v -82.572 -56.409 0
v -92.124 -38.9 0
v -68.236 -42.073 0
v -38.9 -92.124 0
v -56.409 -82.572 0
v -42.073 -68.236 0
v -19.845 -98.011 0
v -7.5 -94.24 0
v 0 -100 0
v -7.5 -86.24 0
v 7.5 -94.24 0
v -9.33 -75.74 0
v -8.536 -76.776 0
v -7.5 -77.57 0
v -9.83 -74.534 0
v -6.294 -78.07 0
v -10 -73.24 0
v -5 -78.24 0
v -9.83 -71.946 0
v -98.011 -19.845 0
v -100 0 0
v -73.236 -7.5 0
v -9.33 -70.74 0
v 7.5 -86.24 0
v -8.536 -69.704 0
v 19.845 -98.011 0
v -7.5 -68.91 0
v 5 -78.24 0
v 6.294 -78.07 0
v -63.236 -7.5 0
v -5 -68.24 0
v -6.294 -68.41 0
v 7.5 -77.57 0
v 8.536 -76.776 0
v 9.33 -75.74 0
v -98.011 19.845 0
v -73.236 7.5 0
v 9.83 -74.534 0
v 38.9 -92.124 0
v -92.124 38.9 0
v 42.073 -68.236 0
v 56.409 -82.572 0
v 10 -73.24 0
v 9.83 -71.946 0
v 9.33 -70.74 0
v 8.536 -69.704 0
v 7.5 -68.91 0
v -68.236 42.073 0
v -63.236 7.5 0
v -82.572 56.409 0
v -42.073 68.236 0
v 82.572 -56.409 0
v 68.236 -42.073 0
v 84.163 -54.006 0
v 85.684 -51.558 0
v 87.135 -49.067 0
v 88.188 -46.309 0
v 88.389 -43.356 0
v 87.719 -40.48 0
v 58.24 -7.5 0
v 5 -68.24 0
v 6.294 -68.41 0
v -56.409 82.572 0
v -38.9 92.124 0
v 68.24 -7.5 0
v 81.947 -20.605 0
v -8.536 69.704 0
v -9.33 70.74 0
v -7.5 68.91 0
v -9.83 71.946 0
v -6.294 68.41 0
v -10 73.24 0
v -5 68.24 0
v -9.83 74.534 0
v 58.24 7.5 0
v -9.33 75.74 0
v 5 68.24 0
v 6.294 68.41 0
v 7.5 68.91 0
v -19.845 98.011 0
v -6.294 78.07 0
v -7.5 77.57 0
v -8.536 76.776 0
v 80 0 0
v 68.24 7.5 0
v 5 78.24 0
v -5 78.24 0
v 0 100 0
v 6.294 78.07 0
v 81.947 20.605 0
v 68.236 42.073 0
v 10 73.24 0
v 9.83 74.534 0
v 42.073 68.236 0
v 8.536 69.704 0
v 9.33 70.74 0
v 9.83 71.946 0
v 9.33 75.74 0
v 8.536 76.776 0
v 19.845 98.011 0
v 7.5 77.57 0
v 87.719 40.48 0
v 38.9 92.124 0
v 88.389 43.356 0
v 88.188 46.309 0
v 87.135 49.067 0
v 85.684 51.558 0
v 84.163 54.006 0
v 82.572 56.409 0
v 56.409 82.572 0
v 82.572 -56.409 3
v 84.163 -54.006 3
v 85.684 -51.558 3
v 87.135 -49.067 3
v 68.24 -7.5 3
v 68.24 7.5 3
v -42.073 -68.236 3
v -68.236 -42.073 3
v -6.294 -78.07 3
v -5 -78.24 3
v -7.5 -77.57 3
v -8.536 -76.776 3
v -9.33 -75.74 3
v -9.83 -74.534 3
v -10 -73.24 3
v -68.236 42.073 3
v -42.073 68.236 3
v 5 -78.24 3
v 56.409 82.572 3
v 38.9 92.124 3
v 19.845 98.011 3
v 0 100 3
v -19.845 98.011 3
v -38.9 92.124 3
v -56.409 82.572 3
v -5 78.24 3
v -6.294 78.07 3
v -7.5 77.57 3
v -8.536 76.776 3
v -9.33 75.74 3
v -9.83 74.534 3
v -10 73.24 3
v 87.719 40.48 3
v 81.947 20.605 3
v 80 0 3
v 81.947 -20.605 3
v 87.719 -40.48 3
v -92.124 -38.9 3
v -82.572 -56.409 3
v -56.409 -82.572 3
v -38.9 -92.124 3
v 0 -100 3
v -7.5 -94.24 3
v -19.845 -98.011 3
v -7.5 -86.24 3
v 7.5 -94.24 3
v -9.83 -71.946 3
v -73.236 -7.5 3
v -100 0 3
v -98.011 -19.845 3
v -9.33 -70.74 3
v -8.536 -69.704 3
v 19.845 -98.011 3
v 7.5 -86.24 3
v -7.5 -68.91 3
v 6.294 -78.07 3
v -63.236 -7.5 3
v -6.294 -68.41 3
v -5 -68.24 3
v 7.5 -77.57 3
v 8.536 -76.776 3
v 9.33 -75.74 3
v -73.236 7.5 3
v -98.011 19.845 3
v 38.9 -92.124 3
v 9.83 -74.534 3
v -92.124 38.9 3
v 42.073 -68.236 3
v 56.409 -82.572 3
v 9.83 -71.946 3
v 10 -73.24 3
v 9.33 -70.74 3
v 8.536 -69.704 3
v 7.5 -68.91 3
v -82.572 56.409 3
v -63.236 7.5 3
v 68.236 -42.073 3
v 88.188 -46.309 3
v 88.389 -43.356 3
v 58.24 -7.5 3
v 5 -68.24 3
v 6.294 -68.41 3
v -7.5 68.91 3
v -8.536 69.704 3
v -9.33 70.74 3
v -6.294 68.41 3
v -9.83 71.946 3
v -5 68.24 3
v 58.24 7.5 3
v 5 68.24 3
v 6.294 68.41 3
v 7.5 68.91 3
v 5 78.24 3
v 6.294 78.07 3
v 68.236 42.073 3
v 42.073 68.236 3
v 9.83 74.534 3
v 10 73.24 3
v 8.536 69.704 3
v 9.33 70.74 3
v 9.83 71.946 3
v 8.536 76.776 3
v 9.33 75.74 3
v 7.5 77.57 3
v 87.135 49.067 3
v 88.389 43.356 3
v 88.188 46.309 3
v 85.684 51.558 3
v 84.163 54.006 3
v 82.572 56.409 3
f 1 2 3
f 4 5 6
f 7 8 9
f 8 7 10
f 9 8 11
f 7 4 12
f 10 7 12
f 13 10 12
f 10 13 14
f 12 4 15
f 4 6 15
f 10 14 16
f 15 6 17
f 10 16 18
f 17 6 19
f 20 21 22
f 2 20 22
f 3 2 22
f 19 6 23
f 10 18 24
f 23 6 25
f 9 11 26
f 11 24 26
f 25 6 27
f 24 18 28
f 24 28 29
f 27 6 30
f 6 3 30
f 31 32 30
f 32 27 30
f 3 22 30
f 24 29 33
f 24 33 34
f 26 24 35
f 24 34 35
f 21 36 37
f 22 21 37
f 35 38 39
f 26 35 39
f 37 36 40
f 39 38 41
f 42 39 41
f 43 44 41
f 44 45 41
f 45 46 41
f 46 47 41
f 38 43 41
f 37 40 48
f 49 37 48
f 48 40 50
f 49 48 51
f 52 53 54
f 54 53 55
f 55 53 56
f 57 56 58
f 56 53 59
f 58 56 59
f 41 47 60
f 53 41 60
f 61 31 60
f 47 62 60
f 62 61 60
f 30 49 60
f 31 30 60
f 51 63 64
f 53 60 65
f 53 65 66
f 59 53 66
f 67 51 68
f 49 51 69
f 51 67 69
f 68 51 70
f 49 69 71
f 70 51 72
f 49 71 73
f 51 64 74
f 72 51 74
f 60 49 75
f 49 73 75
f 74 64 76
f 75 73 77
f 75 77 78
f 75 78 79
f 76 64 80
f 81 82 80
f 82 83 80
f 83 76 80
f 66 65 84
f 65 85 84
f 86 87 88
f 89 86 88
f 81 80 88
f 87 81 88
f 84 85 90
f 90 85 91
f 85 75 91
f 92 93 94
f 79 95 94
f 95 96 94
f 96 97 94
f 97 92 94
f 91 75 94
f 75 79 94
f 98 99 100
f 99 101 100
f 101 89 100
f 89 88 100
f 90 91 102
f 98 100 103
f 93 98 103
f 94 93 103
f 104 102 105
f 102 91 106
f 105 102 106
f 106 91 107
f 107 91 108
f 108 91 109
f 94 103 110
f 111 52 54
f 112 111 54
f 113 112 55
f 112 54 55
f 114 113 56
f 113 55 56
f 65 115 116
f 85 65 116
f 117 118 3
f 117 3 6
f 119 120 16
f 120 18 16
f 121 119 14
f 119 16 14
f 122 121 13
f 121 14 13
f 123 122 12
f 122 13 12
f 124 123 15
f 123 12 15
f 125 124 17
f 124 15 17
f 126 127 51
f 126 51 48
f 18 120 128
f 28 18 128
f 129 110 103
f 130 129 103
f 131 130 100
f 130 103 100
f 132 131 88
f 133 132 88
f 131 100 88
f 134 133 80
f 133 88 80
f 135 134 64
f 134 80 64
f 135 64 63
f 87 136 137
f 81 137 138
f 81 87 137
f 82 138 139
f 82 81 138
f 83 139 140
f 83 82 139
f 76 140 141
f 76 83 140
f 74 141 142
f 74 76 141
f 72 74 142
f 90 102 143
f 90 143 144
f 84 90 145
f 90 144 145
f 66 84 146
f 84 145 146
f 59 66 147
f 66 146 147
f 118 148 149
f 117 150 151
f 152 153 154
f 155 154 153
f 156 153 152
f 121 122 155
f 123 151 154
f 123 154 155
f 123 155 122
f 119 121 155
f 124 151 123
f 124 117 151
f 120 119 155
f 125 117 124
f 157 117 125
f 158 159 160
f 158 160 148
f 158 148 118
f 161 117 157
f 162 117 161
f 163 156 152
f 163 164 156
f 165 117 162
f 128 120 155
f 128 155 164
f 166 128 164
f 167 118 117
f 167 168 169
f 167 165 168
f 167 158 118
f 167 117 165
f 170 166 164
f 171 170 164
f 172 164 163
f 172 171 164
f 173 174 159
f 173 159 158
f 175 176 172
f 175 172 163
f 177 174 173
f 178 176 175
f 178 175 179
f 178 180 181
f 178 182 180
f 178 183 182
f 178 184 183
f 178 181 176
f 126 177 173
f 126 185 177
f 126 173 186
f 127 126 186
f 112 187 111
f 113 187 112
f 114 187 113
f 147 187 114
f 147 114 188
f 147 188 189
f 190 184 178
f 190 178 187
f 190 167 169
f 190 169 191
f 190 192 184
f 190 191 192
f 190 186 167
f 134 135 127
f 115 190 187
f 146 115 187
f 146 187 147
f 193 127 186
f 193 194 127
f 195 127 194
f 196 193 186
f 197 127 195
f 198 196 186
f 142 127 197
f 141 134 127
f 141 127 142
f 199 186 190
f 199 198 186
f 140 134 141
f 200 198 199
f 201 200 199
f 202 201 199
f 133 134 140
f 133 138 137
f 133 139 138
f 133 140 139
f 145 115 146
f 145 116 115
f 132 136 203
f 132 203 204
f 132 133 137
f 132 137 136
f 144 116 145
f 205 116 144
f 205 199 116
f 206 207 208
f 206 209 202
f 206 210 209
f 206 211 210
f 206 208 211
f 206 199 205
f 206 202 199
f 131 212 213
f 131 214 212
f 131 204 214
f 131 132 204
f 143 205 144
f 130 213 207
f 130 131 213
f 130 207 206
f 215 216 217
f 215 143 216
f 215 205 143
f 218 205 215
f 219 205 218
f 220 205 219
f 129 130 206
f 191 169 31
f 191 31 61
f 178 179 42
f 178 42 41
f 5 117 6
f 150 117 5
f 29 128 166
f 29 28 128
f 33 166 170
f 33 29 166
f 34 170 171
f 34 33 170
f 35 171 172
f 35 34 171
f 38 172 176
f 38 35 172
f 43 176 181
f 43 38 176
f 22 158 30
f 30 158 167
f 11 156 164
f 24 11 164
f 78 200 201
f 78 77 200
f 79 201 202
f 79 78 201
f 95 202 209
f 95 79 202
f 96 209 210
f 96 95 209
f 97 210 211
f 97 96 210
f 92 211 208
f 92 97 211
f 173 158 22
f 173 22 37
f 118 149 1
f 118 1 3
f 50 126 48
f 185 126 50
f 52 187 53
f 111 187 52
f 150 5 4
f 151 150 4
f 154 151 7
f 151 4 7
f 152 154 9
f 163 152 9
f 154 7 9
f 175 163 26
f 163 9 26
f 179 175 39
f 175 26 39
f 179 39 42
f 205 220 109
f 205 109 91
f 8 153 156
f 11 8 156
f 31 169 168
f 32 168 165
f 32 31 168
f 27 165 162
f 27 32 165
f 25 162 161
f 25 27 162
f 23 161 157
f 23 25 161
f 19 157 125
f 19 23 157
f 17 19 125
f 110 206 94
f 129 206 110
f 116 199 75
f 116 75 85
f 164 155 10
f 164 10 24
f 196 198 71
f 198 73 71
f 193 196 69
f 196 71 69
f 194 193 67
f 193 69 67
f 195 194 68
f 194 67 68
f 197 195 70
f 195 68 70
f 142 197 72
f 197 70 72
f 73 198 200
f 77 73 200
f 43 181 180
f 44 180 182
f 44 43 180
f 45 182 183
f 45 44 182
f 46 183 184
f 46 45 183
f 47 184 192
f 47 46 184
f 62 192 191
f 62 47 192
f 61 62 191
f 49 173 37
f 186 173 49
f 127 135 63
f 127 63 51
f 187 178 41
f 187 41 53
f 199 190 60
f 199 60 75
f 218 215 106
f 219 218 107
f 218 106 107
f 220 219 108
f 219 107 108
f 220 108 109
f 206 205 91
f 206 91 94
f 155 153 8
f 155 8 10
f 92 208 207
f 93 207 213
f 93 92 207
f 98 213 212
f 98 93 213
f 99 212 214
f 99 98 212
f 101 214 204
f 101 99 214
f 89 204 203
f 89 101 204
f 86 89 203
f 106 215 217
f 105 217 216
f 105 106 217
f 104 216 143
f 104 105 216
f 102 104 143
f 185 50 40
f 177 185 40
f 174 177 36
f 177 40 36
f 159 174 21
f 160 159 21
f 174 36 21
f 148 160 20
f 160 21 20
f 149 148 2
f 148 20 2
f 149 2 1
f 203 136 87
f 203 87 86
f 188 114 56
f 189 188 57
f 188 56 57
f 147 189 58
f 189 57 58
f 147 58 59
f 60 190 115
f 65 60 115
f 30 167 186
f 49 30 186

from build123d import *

# Parameters (mm, degrees)
CROQUIS1_R              = 100
SALIENTE_EXTRUIR1_DEPTH = 3
CROQUIS3_R              = 110
CORTAR_EXTRUIR1_DEPTH   = 3
REDONDEO1_R             = 10
CORTAR_EXTRUIR2_DEPTH   = 142.453172607
CROQUIS6_W              = 10
CROQUIS6_H              = 15
CROQUIS6_W_2            = 20
CROQUIS6_H_2            = 10
CROQUIS6_W_3            = 15
CROQUIS6_H_3            = 8
CORTAR_EXTRUIR4_DEPTH   = 10
REDONDEO3_R             = 5


with BuildPart() as part:
    # Croquis1 → Saliente-Extruir1 (new body)
    with BuildSketch(Plane.XY):
        Circle(CROQUIS1_R)
    extrude(amount=SALIENTE_EXTRUIR1_DEPTH)

    # Croquis3 → Cortar-Extruir1 (cut)
    with BuildSketch(Plane.XY.offset(3)):
        with Locations((190, 0)):
            Circle(CROQUIS3_R)
    extrude(amount=-CORTAR_EXTRUIR1_DEPTH, mode=Mode.SUBTRACT)

    # Redondeo1
    redondeo1_edges = [part.edges().sort_by_distance(p)[0] for p in [
        (89.473684211, -44.659375654, 1.5),
        (89.473684211, 44.659375654, 1.5),
    ]]
    fillet(redondeo1_edges, radius=REDONDEO1_R)

    # Croquis4 → Cortar-Extruir2 (cut, through all)
    with BuildSketch(Plane.XY.offset(3)):
        Polygon((-57.629202667, -83.792153571), (-83.792153571, -57.629202667), (-68.235804385, -42.072853481), (-42.072853481, -68.235804385), align=None)
        Polygon((-57.629202667, 83.792153571), (-42.072853481, 68.235804385), (-68.235804385, 42.072853481), (-83.792153571, 57.629202667), align=None)
        Polygon((83.792153571, 57.629202667), (68.235804385, 42.072853481), (42.072853481, 68.235804385), (57.629202667, 83.792153571), align=None)
        Polygon((57.629202667, -83.792153571), (42.072853481, -68.235804385), (68.235804385, -42.072853481), (83.792153571, -57.629202667), align=None)
    extrude(amount=-CORTAR_EXTRUIR2_DEPTH, mode=Mode.SUBTRACT)

    # Croquis6 → Cortar-Extruir4 (cut)
    with BuildSketch(Plane.XY.offset(3)):
        with Locations((63.24, 0)):
            Rectangle(CROQUIS6_W, CROQUIS6_H)
        with Locations((-68.235804385, 0)):
            Rectangle(CROQUIS6_W, CROQUIS6_H)
        with Locations((0, 73.24)):
            Rectangle(CROQUIS6_W_2, CROQUIS6_H_2)
        with Locations((0, -73.24)):
            Rectangle(CROQUIS6_W_2, CROQUIS6_H_2)
        with Locations((0, -90.24)):
            Rectangle(CROQUIS6_W_3, CROQUIS6_H_3)
    extrude(amount=-CORTAR_EXTRUIR4_DEPTH, mode=Mode.SUBTRACT)

    # Redondeo3
    redondeo3_edges = [part.edges().sort_by_distance(p)[0] for p in [
        (10, 68.24, 1.5),
        (-10, 68.24, 1.5),
        (10, 78.24, 1.5),
        (-10, 78.24, 1.5),
        (10, -78.24, 1.5),
        (-10, -78.24, 1.5),
        (10, -68.24, 1.5),
        (-10, -68.24, 1.5),
    ]]
    fillet(redondeo3_edges, radius=REDONDEO3_R - 0.0001)  # a hair under: the kernel refuses the full size


solid = part.part
